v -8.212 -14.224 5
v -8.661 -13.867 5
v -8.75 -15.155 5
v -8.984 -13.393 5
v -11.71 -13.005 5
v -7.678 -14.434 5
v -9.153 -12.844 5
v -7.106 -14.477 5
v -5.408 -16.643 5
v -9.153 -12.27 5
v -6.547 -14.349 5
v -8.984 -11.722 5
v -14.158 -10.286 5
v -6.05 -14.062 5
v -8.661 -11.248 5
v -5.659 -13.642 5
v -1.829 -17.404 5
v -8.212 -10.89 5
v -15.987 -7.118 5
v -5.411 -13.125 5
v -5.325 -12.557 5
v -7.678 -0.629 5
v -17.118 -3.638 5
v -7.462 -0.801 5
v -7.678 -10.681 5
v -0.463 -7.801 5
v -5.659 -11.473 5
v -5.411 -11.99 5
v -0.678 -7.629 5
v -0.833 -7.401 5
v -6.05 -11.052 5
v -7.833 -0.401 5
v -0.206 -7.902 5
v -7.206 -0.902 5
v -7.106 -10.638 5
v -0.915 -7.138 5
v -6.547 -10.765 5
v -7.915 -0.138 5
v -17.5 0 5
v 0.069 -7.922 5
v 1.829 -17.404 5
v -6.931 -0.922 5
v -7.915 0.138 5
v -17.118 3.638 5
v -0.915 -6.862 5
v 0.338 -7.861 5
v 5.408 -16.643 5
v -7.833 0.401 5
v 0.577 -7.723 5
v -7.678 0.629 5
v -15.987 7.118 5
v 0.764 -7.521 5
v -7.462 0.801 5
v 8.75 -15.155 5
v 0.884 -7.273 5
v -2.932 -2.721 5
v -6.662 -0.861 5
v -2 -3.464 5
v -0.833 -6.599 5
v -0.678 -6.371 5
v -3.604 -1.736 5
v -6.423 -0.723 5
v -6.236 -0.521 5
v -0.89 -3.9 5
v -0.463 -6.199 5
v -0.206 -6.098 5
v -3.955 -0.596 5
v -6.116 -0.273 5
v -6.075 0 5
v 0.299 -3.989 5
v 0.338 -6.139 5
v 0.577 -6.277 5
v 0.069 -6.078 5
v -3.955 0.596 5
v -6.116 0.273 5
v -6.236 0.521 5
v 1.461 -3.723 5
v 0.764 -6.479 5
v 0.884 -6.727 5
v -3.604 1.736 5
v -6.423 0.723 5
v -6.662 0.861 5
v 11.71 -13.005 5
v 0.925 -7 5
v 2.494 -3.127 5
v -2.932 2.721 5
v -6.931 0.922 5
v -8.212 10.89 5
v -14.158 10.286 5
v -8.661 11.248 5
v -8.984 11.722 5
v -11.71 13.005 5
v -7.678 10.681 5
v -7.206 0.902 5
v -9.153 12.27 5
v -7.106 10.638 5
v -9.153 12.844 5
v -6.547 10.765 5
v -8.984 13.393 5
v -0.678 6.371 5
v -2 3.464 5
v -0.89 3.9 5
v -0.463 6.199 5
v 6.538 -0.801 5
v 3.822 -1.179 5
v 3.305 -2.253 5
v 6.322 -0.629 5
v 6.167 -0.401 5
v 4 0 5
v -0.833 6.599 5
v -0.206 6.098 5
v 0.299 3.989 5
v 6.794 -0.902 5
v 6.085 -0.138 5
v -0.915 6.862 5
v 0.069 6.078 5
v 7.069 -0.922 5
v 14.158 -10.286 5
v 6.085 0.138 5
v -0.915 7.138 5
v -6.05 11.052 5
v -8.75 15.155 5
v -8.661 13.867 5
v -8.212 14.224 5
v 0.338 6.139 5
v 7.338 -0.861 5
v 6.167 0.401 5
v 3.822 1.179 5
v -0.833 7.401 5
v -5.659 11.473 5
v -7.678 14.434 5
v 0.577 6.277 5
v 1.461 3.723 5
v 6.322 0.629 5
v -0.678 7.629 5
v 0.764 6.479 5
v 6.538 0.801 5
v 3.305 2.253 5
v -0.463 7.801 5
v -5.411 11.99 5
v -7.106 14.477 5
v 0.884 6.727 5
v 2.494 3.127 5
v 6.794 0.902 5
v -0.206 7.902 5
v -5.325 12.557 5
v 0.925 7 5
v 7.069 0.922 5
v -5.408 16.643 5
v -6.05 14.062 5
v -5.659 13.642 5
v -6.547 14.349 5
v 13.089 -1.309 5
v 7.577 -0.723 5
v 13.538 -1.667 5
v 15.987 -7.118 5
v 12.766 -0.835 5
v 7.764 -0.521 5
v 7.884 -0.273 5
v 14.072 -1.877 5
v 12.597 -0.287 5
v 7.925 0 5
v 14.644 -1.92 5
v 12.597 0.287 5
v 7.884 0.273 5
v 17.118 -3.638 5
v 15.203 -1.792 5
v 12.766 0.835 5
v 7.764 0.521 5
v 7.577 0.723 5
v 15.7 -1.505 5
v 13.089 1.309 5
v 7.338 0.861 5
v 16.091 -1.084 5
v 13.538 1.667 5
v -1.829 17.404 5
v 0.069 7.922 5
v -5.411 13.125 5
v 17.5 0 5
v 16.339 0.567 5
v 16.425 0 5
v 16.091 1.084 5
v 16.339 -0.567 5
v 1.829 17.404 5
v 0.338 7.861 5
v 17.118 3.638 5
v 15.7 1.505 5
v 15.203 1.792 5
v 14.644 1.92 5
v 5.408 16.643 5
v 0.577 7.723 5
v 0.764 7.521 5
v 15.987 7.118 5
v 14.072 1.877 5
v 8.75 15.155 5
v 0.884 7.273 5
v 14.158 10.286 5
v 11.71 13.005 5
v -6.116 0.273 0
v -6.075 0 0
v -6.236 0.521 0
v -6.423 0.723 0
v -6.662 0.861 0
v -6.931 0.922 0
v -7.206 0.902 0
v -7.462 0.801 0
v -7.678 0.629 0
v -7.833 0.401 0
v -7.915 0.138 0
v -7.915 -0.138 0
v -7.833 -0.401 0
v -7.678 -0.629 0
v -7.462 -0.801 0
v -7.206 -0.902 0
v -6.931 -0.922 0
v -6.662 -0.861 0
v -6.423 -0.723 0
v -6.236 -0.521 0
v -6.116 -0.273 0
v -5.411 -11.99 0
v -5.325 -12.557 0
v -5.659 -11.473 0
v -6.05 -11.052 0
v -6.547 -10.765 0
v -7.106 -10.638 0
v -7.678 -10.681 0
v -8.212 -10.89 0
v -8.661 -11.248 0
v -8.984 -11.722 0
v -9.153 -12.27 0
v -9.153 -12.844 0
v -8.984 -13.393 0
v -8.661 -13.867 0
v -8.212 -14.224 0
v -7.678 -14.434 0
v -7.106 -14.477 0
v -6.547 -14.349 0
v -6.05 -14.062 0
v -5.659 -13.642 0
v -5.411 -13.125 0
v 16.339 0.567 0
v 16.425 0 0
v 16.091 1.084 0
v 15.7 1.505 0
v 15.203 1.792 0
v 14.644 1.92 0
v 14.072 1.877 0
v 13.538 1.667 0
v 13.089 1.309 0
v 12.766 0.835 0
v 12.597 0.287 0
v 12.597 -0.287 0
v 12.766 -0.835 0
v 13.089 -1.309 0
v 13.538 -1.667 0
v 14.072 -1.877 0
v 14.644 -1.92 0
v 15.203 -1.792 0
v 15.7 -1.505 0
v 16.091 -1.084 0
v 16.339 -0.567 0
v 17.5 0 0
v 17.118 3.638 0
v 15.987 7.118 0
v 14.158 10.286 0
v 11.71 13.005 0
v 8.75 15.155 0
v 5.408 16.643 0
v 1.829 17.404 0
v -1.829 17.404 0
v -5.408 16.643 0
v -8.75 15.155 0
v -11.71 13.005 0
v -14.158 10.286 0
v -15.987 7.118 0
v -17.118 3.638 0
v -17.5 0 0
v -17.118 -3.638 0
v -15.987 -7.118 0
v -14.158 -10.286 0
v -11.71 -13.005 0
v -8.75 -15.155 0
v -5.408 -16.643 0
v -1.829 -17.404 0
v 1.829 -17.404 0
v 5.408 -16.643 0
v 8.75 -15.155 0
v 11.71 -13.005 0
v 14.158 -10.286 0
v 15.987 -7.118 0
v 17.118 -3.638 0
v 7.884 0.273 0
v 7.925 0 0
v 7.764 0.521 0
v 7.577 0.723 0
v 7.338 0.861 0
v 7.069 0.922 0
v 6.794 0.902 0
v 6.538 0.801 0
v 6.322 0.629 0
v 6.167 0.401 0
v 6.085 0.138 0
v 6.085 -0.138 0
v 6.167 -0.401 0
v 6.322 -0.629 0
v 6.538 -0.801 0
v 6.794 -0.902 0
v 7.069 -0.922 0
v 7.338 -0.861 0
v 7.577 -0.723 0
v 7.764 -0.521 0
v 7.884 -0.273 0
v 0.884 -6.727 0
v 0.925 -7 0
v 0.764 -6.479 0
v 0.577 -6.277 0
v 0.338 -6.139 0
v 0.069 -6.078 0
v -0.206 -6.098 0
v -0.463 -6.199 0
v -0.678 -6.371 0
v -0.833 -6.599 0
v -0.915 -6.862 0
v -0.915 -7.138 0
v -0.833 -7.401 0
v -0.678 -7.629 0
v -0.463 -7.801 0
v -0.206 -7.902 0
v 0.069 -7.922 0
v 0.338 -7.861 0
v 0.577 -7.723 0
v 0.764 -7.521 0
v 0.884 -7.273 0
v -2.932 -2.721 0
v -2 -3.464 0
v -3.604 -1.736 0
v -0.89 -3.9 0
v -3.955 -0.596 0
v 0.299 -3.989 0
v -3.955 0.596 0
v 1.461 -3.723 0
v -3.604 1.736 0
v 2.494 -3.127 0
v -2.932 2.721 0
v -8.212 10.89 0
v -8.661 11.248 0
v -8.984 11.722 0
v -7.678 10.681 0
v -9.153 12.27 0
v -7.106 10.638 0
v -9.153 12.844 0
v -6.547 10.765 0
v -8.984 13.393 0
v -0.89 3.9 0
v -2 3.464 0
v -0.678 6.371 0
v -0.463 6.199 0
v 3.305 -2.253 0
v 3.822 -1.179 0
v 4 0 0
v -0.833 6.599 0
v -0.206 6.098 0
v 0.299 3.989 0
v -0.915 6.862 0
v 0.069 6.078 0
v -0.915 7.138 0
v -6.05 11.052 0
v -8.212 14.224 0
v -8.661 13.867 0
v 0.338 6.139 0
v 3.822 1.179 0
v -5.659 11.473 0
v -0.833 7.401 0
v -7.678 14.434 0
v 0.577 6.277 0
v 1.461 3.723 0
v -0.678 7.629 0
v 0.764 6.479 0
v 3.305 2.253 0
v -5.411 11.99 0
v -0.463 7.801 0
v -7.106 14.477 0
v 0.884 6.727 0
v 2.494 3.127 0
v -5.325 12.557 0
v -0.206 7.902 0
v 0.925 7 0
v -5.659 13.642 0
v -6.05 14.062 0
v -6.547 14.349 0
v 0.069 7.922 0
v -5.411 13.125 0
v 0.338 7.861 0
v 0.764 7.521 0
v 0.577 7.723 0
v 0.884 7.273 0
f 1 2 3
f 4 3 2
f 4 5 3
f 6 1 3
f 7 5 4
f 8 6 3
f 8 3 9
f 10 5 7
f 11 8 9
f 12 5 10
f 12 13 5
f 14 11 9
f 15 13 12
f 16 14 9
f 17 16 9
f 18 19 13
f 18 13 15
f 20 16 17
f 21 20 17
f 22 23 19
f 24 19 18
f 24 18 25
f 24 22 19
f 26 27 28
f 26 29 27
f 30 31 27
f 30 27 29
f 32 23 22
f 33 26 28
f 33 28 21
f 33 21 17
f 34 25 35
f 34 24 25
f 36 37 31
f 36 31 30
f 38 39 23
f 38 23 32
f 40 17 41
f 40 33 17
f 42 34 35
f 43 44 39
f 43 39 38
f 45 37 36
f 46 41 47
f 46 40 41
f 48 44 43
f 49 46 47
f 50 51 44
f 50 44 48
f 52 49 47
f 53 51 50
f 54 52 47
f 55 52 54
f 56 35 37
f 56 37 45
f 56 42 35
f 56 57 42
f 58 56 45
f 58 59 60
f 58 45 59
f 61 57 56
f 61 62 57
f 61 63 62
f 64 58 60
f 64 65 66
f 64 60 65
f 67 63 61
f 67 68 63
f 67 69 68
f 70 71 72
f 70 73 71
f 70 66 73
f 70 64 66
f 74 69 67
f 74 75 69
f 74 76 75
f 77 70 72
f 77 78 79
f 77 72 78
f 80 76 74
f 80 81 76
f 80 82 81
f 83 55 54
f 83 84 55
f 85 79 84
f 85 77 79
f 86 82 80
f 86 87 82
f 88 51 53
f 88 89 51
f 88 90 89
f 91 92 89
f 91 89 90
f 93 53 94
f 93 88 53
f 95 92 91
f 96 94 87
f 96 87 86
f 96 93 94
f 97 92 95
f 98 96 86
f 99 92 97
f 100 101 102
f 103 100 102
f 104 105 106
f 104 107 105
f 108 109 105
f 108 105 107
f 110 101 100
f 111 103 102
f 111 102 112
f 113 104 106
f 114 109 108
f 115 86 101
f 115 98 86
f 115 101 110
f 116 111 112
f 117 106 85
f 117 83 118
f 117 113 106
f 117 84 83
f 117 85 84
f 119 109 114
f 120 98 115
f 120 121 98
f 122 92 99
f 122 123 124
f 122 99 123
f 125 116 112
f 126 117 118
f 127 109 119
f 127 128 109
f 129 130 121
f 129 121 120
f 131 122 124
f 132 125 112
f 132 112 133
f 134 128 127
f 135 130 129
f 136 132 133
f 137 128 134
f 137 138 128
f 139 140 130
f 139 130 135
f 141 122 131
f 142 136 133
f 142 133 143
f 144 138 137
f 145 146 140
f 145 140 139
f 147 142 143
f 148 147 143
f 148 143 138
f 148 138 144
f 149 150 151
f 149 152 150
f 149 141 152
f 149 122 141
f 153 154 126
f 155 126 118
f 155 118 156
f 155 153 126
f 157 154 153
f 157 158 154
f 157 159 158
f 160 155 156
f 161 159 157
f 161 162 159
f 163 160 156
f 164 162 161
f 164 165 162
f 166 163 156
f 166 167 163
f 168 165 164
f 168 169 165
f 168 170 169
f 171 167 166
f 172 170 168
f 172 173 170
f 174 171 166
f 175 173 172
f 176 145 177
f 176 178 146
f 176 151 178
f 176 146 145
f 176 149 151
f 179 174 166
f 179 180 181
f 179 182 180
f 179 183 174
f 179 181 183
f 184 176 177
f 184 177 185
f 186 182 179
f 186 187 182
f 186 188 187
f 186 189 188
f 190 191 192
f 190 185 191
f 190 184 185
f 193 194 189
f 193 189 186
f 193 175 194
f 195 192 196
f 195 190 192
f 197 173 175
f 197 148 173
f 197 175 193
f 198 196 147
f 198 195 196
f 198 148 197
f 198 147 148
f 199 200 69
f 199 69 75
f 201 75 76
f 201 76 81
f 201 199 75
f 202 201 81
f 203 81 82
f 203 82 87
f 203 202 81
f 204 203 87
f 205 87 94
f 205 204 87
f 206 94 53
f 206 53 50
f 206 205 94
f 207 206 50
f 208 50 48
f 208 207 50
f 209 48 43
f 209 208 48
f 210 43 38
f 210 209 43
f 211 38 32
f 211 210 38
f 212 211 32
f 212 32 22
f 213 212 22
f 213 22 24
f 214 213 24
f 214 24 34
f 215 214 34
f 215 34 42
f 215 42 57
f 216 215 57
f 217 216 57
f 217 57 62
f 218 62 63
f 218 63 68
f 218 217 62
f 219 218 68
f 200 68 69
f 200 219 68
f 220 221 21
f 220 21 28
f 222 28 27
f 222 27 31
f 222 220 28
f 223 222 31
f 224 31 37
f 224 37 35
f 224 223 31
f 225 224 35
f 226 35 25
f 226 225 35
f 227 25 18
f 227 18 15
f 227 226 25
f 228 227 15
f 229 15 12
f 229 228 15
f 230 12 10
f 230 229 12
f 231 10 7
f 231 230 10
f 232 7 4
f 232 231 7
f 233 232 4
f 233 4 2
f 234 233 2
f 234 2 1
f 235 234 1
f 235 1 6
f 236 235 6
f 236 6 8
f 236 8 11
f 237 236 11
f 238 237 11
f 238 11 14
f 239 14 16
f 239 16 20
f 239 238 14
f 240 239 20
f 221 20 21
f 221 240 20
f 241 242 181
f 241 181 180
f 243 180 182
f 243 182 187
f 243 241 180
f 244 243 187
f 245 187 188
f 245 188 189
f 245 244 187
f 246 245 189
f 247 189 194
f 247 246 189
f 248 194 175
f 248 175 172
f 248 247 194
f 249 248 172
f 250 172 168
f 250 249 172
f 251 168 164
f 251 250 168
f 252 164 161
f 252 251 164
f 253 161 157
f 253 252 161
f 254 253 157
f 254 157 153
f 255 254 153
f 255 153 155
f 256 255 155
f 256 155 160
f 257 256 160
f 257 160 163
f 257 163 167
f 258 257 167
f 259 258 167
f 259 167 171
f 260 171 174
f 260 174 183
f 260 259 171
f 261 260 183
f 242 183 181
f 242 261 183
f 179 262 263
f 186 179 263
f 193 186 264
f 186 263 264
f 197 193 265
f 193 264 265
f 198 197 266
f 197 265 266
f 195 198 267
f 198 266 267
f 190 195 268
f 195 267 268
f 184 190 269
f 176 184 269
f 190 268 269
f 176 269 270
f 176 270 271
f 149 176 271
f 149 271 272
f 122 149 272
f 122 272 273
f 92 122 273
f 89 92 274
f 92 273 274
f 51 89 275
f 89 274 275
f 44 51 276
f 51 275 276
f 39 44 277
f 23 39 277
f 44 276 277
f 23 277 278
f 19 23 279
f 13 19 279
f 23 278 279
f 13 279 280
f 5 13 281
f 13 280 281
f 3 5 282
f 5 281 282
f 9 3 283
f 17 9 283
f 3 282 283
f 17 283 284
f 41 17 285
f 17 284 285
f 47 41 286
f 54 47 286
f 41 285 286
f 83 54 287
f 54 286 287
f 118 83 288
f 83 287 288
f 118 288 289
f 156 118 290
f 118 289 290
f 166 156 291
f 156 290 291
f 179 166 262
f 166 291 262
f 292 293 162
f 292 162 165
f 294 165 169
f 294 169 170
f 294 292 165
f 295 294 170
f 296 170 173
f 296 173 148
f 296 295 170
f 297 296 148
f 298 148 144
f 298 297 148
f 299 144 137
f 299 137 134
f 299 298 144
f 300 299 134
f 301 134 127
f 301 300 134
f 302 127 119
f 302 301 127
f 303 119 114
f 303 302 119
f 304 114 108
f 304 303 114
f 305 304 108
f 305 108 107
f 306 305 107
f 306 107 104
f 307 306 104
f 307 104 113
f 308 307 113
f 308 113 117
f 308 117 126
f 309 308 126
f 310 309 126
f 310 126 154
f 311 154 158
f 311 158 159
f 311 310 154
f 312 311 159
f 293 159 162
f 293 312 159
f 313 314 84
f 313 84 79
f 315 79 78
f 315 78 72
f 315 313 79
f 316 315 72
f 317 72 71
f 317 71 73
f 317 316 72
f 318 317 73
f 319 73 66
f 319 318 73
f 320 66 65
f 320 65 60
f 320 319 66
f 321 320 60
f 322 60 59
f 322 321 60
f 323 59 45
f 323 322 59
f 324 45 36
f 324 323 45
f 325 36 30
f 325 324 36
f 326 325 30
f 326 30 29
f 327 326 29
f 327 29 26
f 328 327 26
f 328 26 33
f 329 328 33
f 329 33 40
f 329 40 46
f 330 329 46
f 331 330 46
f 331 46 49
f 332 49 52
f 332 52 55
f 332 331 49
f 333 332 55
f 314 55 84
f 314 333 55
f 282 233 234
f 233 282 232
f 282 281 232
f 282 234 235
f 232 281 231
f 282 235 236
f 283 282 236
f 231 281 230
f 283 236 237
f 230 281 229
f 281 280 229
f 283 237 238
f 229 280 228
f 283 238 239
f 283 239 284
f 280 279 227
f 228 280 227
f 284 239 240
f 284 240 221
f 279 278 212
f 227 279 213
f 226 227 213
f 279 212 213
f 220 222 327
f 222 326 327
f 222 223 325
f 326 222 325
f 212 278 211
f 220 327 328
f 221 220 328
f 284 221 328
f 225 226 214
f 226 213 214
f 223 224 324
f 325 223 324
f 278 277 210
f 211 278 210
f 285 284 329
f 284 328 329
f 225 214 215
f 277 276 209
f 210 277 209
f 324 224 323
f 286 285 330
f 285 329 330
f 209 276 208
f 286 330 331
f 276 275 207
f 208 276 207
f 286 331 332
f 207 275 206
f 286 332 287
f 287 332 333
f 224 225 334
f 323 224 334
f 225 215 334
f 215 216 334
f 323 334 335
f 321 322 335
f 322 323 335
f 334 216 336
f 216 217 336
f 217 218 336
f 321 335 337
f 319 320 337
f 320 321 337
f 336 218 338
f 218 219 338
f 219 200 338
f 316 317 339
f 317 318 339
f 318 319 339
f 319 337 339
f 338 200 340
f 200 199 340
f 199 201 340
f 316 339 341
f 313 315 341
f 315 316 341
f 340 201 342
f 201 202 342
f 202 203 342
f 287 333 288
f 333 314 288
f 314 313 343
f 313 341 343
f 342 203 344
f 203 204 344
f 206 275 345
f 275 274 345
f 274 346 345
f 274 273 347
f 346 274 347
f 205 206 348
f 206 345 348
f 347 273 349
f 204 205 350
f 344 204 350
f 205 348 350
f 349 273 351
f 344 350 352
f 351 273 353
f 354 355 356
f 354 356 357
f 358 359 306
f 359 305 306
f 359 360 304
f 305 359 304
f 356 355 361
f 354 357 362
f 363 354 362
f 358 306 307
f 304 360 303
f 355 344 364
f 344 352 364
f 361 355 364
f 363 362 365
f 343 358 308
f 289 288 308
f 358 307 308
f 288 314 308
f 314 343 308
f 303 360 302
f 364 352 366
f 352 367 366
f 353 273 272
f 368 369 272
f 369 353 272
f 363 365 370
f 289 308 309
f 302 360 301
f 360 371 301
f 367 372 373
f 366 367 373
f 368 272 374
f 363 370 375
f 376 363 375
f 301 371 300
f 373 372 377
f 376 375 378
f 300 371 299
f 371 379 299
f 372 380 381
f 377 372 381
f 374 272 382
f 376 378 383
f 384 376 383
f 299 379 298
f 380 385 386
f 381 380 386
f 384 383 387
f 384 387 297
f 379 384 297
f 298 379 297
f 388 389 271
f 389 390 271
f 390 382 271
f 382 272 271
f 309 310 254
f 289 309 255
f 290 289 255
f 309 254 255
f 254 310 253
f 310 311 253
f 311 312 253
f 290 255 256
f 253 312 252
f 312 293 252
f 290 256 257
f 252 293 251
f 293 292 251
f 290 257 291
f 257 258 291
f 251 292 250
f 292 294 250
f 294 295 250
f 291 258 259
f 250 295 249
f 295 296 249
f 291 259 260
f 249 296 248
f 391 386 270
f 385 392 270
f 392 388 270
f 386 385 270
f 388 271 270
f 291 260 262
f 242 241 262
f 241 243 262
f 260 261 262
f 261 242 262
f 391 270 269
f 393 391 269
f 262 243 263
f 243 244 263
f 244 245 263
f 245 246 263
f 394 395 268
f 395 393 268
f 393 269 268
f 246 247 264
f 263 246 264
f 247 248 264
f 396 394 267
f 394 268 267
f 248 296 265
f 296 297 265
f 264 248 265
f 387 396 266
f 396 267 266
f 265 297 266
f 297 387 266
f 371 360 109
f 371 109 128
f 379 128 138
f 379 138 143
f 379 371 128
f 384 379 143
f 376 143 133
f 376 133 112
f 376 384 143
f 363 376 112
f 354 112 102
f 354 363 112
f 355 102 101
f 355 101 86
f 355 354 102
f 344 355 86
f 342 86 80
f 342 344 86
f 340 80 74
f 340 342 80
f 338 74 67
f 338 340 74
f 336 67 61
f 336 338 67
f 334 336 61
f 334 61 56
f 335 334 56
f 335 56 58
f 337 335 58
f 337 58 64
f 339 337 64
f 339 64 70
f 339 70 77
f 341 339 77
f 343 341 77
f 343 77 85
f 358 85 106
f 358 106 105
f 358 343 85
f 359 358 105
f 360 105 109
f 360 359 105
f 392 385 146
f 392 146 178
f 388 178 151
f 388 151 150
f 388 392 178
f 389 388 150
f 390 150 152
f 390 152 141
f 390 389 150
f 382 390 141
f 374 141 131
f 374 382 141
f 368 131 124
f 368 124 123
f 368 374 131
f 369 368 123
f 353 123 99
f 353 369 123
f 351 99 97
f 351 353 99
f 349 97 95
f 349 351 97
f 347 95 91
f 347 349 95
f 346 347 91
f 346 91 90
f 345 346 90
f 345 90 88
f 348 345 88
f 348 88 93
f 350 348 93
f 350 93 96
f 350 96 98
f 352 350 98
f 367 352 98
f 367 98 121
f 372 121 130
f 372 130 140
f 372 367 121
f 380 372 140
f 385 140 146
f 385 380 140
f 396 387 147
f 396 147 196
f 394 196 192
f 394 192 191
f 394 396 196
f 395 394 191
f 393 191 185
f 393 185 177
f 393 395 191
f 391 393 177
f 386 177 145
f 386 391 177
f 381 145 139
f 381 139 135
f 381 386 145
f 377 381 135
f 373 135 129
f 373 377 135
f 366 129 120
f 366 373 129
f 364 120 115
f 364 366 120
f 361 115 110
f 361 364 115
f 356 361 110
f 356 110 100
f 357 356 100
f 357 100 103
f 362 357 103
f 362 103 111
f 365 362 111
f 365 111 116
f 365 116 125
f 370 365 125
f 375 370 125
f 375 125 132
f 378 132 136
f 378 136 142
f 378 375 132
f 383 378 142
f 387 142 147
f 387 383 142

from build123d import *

# Parameters (mm, degrees)
ESQUISSE1_R        = 17.5
ESQUISSE1_R_2      = 0.925
ESQUISSE1_R_3      = 1.925
ESQUISSE1_R_4      = 4
BOSS_EXTRU_1_DEPTH = 5


with BuildPart() as part:
    # Esquisse1 → Boss.-Extru.1 (new body)
    with BuildSketch(Plane.XY):
        Circle(ESQUISSE1_R)
        with Locations((0, -7)):
            Circle(ESQUISSE1_R_2, mode=Mode.SUBTRACT)
        with Locations((-7, 0)):
            Circle(ESQUISSE1_R_2, mode=Mode.SUBTRACT)
        with Locations((0, 7)):
            Circle(ESQUISSE1_R_2, mode=Mode.SUBTRACT)
        with Locations((-7.25, -12.557368355)):
            Circle(ESQUISSE1_R_3, mode=Mode.SUBTRACT)
        with Locations((-7.25, 12.557368355)):
            Circle(ESQUISSE1_R_3, mode=Mode.SUBTRACT)
        Circle(ESQUISSE1_R_4, mode=Mode.SUBTRACT)
        with Locations((14.5, 0)):
            Circle(ESQUISSE1_R_3, mode=Mode.SUBTRACT)
        with Locations((7, 0)):
            Circle(ESQUISSE1_R_2, mode=Mode.SUBTRACT)
    extrude(amount=BOSS_EXTRU_1_DEPTH)


solid = part.part
